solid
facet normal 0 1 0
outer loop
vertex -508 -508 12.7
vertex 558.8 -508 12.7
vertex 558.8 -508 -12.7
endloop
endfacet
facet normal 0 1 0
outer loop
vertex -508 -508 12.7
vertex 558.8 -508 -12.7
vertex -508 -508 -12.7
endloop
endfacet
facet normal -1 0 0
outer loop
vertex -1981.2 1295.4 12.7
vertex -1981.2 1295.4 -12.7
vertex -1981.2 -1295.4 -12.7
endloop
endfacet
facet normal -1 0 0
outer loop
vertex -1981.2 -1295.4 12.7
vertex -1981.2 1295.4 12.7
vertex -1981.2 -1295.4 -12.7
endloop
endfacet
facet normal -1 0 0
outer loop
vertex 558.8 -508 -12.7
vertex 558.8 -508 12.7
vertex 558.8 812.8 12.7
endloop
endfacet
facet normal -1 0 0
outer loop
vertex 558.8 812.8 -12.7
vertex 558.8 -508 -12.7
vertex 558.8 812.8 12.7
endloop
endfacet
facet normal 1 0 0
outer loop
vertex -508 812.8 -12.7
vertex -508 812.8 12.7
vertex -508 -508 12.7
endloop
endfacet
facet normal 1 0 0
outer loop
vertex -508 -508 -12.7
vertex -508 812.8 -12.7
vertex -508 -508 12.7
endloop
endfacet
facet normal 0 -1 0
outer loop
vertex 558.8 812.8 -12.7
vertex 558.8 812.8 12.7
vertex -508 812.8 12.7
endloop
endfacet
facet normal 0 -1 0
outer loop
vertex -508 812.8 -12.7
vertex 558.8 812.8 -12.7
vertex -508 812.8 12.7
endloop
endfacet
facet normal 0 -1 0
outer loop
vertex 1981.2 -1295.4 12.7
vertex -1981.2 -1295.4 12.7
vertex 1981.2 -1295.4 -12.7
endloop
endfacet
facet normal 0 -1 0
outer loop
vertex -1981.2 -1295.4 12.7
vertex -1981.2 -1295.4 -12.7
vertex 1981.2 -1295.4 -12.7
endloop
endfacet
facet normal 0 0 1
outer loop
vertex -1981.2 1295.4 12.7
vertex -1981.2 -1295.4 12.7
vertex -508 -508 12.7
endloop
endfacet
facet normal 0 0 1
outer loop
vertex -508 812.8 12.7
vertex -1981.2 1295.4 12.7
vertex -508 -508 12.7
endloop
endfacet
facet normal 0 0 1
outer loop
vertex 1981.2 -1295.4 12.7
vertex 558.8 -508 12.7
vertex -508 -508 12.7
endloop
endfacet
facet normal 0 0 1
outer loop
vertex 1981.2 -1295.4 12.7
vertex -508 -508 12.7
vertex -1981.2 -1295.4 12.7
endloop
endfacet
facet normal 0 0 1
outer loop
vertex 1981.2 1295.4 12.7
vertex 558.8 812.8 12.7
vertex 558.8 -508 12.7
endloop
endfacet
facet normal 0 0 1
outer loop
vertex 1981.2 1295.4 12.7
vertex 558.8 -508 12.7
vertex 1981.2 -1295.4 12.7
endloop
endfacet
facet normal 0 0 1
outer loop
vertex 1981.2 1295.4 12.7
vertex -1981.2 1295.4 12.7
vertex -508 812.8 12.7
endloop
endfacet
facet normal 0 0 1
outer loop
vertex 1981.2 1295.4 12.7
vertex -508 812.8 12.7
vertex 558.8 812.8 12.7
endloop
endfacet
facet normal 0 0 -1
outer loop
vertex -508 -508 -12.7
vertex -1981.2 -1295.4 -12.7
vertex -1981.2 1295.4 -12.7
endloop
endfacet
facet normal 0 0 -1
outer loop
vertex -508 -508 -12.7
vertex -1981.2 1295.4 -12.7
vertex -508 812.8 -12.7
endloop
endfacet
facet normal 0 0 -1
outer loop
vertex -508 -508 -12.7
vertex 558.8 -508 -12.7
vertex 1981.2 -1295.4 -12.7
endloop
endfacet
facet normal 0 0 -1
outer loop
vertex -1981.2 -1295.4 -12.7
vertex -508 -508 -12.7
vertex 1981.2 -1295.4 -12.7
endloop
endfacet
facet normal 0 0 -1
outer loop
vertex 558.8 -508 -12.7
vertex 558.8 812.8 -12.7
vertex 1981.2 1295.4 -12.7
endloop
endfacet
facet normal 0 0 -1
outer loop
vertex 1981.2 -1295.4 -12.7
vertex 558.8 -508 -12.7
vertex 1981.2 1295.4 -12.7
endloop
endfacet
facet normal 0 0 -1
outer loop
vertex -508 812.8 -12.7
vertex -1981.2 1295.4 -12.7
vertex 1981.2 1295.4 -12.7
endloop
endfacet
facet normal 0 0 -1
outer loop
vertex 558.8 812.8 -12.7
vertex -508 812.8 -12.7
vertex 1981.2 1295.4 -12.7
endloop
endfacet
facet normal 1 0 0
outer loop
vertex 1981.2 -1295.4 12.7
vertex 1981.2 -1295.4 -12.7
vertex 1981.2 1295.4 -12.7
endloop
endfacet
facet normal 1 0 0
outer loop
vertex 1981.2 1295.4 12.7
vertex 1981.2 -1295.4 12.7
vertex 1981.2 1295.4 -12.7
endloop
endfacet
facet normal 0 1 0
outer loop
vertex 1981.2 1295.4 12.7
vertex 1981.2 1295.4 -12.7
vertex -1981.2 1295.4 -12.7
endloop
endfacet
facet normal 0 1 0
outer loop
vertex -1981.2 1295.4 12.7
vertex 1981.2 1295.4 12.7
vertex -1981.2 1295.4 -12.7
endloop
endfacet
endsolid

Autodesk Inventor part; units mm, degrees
ref_plane "YZ Plane" through (0, 0, 0) normal (1, 0, 0) x (0, 1, 0)
ref_plane "XZ Plane" through (0, 0, 0) normal (0, 1, 0) x (-1, 0, 0)
ref_plane "XY Plane" through (0, 0, 0) normal (0, 0, 1) x (1, 0, 0)
sketch "Sketch1" plane through (0, 0, 0) normal (0, 0, 1) x (1, 0, 0)
  line L0 (0, 1813.56) -> (0, -1813.56) projected
  line L1 (-2773.68, 0) -> (2773.68, 0) projected
  line L2 (0, -1813.56) -> (0, 1813.56) projected
  line L3 (-2773.68, 0) -> (2773.68, 0) projected
  line L4 (-1981.2, -1295.4) -> (1981.2, -1295.4)
  line L5 (1981.2, -1295.4) -> (1981.2, 1295.4)
  line L6 (1981.2, 1295.4) -> (-1981.2, 1295.4)
  line L7 (-1981.2, 1295.4) -> (-1981.2, -1295.4)
  point P0 (0, 0)
  dimension "d0" = 3962.4
  dimension "d1" = 2590.8
extrude "Extrusion1" add sketch "Sketch1" along normal mid plane 25.4
sketch "Sketch2" plane through (0, 0, 12.7) normal (0, 0, 1) x (1, 0, 0)
  line L0 (-1981.2, -1295.4) -> (1981.2, -1295.4) projected
  line L1 (1981.2, -1295.4) -> (1981.2, 1295.4) projected
  line L2 (1981.2, 1295.4) -> (-1981.2, 1295.4) projected
  line L3 (-1981.2, 1295.4) -> (-1981.2, -1295.4) projected
  line L4 (1981.2, 1295.4) -> (-1981.2, 1295.4) projected
  line L5 (-1981.2, -1295.4) -> (-558.8, -1295.4)
  line L6 (-558.8, -1295.4) -> (-558.8, 1295.4)
  line L7 (-558.8, 1295.4) -> (-1981.2, 1295.4)
  line L8 (-1981.2, 1295.4) -> (-1981.2, -1295.4)
  line L9 (1981.2, -1295.4) -> (609.6, -1295.4)
  line L10 (609.6, -1295.4) -> (609.6, 1295.4)
  line L11 (609.6, 1295.4) -> (1981.2, 1295.4)
  line L12 (1981.2, 1295.4) -> (1981.2, -1295.4)
  line L13 (-558.8, 1295.4) -> (-508, 1295.4)
  line L14 (-508, 1295.4) -> (-508, -1295.4)
  line L15 (-508, -1295.4) -> (-558.8, -1295.4)
  line L16 (-558.8, -1295.4) -> (-558.8, 1295.4)
  line L17 (609.6, -1295.4) -> (558.8, -1295.4)
  line L18 (558.8, -1295.4) -> (558.8, 1295.4)
  line L19 (558.8, 1295.4) -> (609.6, 1295.4)
  line L20 (609.6, 1295.4) -> (609.6, -1295.4)
  line L21 (-508, 1295.4) -> (558.8, 1295.4)
  line L22 (558.8, 1295.4) -> (558.8, -1295.4)
  line L23 (558.8, -1295.4) -> (-508, -1295.4)
  line L24 (-508, -1295.4) -> (-508, 1295.4)
  line L25 (-508, 1295.4) -> (558.8, 1295.4)
  line L26 (558.8, 1295.4) -> (558.8, 889)
  line L27 (558.8, 889) -> (-508, 889)
  line L28 (-508, 889) -> (-508, 1295.4)
  line L29 (-508, 889) -> (-406.4, 889)
  line L30 (-508, 592.1375) -> (-508, 889)
  line L31 (-508, 889) -> (558.8, 889)
  line L32 (558.8, 889) -> (558.8, 812.8)
  line L33 (558.8, 812.8) -> (-508, 812.8)
  line L34 (-508, 812.8) -> (-508, 889)
  line L35 (-508, 812.8) -> (558.8, 812.8)
  line L36 (558.8, 812.8) -> (558.8, -508)
  line L37 (558.8, -508) -> (-508, -508)
  line L38 (-508, -508) -> (-508, 812.8)
  point P0 (0, 0)
  dimension "d4" = 1422.4
  dimension "d5" = 1371.6
  dimension "d6" = 50.8
  dimension "d7" = 50.8
  dimension "d8" = 406.4
  dimension "d10" = 76.2
  dimension "d11" = 1320.8
extrude "Extrusion2" cut sketch "Sketch2" against normal blind 25.4 contours L14 L33 L18 L37
properties part number "SouthWall"
